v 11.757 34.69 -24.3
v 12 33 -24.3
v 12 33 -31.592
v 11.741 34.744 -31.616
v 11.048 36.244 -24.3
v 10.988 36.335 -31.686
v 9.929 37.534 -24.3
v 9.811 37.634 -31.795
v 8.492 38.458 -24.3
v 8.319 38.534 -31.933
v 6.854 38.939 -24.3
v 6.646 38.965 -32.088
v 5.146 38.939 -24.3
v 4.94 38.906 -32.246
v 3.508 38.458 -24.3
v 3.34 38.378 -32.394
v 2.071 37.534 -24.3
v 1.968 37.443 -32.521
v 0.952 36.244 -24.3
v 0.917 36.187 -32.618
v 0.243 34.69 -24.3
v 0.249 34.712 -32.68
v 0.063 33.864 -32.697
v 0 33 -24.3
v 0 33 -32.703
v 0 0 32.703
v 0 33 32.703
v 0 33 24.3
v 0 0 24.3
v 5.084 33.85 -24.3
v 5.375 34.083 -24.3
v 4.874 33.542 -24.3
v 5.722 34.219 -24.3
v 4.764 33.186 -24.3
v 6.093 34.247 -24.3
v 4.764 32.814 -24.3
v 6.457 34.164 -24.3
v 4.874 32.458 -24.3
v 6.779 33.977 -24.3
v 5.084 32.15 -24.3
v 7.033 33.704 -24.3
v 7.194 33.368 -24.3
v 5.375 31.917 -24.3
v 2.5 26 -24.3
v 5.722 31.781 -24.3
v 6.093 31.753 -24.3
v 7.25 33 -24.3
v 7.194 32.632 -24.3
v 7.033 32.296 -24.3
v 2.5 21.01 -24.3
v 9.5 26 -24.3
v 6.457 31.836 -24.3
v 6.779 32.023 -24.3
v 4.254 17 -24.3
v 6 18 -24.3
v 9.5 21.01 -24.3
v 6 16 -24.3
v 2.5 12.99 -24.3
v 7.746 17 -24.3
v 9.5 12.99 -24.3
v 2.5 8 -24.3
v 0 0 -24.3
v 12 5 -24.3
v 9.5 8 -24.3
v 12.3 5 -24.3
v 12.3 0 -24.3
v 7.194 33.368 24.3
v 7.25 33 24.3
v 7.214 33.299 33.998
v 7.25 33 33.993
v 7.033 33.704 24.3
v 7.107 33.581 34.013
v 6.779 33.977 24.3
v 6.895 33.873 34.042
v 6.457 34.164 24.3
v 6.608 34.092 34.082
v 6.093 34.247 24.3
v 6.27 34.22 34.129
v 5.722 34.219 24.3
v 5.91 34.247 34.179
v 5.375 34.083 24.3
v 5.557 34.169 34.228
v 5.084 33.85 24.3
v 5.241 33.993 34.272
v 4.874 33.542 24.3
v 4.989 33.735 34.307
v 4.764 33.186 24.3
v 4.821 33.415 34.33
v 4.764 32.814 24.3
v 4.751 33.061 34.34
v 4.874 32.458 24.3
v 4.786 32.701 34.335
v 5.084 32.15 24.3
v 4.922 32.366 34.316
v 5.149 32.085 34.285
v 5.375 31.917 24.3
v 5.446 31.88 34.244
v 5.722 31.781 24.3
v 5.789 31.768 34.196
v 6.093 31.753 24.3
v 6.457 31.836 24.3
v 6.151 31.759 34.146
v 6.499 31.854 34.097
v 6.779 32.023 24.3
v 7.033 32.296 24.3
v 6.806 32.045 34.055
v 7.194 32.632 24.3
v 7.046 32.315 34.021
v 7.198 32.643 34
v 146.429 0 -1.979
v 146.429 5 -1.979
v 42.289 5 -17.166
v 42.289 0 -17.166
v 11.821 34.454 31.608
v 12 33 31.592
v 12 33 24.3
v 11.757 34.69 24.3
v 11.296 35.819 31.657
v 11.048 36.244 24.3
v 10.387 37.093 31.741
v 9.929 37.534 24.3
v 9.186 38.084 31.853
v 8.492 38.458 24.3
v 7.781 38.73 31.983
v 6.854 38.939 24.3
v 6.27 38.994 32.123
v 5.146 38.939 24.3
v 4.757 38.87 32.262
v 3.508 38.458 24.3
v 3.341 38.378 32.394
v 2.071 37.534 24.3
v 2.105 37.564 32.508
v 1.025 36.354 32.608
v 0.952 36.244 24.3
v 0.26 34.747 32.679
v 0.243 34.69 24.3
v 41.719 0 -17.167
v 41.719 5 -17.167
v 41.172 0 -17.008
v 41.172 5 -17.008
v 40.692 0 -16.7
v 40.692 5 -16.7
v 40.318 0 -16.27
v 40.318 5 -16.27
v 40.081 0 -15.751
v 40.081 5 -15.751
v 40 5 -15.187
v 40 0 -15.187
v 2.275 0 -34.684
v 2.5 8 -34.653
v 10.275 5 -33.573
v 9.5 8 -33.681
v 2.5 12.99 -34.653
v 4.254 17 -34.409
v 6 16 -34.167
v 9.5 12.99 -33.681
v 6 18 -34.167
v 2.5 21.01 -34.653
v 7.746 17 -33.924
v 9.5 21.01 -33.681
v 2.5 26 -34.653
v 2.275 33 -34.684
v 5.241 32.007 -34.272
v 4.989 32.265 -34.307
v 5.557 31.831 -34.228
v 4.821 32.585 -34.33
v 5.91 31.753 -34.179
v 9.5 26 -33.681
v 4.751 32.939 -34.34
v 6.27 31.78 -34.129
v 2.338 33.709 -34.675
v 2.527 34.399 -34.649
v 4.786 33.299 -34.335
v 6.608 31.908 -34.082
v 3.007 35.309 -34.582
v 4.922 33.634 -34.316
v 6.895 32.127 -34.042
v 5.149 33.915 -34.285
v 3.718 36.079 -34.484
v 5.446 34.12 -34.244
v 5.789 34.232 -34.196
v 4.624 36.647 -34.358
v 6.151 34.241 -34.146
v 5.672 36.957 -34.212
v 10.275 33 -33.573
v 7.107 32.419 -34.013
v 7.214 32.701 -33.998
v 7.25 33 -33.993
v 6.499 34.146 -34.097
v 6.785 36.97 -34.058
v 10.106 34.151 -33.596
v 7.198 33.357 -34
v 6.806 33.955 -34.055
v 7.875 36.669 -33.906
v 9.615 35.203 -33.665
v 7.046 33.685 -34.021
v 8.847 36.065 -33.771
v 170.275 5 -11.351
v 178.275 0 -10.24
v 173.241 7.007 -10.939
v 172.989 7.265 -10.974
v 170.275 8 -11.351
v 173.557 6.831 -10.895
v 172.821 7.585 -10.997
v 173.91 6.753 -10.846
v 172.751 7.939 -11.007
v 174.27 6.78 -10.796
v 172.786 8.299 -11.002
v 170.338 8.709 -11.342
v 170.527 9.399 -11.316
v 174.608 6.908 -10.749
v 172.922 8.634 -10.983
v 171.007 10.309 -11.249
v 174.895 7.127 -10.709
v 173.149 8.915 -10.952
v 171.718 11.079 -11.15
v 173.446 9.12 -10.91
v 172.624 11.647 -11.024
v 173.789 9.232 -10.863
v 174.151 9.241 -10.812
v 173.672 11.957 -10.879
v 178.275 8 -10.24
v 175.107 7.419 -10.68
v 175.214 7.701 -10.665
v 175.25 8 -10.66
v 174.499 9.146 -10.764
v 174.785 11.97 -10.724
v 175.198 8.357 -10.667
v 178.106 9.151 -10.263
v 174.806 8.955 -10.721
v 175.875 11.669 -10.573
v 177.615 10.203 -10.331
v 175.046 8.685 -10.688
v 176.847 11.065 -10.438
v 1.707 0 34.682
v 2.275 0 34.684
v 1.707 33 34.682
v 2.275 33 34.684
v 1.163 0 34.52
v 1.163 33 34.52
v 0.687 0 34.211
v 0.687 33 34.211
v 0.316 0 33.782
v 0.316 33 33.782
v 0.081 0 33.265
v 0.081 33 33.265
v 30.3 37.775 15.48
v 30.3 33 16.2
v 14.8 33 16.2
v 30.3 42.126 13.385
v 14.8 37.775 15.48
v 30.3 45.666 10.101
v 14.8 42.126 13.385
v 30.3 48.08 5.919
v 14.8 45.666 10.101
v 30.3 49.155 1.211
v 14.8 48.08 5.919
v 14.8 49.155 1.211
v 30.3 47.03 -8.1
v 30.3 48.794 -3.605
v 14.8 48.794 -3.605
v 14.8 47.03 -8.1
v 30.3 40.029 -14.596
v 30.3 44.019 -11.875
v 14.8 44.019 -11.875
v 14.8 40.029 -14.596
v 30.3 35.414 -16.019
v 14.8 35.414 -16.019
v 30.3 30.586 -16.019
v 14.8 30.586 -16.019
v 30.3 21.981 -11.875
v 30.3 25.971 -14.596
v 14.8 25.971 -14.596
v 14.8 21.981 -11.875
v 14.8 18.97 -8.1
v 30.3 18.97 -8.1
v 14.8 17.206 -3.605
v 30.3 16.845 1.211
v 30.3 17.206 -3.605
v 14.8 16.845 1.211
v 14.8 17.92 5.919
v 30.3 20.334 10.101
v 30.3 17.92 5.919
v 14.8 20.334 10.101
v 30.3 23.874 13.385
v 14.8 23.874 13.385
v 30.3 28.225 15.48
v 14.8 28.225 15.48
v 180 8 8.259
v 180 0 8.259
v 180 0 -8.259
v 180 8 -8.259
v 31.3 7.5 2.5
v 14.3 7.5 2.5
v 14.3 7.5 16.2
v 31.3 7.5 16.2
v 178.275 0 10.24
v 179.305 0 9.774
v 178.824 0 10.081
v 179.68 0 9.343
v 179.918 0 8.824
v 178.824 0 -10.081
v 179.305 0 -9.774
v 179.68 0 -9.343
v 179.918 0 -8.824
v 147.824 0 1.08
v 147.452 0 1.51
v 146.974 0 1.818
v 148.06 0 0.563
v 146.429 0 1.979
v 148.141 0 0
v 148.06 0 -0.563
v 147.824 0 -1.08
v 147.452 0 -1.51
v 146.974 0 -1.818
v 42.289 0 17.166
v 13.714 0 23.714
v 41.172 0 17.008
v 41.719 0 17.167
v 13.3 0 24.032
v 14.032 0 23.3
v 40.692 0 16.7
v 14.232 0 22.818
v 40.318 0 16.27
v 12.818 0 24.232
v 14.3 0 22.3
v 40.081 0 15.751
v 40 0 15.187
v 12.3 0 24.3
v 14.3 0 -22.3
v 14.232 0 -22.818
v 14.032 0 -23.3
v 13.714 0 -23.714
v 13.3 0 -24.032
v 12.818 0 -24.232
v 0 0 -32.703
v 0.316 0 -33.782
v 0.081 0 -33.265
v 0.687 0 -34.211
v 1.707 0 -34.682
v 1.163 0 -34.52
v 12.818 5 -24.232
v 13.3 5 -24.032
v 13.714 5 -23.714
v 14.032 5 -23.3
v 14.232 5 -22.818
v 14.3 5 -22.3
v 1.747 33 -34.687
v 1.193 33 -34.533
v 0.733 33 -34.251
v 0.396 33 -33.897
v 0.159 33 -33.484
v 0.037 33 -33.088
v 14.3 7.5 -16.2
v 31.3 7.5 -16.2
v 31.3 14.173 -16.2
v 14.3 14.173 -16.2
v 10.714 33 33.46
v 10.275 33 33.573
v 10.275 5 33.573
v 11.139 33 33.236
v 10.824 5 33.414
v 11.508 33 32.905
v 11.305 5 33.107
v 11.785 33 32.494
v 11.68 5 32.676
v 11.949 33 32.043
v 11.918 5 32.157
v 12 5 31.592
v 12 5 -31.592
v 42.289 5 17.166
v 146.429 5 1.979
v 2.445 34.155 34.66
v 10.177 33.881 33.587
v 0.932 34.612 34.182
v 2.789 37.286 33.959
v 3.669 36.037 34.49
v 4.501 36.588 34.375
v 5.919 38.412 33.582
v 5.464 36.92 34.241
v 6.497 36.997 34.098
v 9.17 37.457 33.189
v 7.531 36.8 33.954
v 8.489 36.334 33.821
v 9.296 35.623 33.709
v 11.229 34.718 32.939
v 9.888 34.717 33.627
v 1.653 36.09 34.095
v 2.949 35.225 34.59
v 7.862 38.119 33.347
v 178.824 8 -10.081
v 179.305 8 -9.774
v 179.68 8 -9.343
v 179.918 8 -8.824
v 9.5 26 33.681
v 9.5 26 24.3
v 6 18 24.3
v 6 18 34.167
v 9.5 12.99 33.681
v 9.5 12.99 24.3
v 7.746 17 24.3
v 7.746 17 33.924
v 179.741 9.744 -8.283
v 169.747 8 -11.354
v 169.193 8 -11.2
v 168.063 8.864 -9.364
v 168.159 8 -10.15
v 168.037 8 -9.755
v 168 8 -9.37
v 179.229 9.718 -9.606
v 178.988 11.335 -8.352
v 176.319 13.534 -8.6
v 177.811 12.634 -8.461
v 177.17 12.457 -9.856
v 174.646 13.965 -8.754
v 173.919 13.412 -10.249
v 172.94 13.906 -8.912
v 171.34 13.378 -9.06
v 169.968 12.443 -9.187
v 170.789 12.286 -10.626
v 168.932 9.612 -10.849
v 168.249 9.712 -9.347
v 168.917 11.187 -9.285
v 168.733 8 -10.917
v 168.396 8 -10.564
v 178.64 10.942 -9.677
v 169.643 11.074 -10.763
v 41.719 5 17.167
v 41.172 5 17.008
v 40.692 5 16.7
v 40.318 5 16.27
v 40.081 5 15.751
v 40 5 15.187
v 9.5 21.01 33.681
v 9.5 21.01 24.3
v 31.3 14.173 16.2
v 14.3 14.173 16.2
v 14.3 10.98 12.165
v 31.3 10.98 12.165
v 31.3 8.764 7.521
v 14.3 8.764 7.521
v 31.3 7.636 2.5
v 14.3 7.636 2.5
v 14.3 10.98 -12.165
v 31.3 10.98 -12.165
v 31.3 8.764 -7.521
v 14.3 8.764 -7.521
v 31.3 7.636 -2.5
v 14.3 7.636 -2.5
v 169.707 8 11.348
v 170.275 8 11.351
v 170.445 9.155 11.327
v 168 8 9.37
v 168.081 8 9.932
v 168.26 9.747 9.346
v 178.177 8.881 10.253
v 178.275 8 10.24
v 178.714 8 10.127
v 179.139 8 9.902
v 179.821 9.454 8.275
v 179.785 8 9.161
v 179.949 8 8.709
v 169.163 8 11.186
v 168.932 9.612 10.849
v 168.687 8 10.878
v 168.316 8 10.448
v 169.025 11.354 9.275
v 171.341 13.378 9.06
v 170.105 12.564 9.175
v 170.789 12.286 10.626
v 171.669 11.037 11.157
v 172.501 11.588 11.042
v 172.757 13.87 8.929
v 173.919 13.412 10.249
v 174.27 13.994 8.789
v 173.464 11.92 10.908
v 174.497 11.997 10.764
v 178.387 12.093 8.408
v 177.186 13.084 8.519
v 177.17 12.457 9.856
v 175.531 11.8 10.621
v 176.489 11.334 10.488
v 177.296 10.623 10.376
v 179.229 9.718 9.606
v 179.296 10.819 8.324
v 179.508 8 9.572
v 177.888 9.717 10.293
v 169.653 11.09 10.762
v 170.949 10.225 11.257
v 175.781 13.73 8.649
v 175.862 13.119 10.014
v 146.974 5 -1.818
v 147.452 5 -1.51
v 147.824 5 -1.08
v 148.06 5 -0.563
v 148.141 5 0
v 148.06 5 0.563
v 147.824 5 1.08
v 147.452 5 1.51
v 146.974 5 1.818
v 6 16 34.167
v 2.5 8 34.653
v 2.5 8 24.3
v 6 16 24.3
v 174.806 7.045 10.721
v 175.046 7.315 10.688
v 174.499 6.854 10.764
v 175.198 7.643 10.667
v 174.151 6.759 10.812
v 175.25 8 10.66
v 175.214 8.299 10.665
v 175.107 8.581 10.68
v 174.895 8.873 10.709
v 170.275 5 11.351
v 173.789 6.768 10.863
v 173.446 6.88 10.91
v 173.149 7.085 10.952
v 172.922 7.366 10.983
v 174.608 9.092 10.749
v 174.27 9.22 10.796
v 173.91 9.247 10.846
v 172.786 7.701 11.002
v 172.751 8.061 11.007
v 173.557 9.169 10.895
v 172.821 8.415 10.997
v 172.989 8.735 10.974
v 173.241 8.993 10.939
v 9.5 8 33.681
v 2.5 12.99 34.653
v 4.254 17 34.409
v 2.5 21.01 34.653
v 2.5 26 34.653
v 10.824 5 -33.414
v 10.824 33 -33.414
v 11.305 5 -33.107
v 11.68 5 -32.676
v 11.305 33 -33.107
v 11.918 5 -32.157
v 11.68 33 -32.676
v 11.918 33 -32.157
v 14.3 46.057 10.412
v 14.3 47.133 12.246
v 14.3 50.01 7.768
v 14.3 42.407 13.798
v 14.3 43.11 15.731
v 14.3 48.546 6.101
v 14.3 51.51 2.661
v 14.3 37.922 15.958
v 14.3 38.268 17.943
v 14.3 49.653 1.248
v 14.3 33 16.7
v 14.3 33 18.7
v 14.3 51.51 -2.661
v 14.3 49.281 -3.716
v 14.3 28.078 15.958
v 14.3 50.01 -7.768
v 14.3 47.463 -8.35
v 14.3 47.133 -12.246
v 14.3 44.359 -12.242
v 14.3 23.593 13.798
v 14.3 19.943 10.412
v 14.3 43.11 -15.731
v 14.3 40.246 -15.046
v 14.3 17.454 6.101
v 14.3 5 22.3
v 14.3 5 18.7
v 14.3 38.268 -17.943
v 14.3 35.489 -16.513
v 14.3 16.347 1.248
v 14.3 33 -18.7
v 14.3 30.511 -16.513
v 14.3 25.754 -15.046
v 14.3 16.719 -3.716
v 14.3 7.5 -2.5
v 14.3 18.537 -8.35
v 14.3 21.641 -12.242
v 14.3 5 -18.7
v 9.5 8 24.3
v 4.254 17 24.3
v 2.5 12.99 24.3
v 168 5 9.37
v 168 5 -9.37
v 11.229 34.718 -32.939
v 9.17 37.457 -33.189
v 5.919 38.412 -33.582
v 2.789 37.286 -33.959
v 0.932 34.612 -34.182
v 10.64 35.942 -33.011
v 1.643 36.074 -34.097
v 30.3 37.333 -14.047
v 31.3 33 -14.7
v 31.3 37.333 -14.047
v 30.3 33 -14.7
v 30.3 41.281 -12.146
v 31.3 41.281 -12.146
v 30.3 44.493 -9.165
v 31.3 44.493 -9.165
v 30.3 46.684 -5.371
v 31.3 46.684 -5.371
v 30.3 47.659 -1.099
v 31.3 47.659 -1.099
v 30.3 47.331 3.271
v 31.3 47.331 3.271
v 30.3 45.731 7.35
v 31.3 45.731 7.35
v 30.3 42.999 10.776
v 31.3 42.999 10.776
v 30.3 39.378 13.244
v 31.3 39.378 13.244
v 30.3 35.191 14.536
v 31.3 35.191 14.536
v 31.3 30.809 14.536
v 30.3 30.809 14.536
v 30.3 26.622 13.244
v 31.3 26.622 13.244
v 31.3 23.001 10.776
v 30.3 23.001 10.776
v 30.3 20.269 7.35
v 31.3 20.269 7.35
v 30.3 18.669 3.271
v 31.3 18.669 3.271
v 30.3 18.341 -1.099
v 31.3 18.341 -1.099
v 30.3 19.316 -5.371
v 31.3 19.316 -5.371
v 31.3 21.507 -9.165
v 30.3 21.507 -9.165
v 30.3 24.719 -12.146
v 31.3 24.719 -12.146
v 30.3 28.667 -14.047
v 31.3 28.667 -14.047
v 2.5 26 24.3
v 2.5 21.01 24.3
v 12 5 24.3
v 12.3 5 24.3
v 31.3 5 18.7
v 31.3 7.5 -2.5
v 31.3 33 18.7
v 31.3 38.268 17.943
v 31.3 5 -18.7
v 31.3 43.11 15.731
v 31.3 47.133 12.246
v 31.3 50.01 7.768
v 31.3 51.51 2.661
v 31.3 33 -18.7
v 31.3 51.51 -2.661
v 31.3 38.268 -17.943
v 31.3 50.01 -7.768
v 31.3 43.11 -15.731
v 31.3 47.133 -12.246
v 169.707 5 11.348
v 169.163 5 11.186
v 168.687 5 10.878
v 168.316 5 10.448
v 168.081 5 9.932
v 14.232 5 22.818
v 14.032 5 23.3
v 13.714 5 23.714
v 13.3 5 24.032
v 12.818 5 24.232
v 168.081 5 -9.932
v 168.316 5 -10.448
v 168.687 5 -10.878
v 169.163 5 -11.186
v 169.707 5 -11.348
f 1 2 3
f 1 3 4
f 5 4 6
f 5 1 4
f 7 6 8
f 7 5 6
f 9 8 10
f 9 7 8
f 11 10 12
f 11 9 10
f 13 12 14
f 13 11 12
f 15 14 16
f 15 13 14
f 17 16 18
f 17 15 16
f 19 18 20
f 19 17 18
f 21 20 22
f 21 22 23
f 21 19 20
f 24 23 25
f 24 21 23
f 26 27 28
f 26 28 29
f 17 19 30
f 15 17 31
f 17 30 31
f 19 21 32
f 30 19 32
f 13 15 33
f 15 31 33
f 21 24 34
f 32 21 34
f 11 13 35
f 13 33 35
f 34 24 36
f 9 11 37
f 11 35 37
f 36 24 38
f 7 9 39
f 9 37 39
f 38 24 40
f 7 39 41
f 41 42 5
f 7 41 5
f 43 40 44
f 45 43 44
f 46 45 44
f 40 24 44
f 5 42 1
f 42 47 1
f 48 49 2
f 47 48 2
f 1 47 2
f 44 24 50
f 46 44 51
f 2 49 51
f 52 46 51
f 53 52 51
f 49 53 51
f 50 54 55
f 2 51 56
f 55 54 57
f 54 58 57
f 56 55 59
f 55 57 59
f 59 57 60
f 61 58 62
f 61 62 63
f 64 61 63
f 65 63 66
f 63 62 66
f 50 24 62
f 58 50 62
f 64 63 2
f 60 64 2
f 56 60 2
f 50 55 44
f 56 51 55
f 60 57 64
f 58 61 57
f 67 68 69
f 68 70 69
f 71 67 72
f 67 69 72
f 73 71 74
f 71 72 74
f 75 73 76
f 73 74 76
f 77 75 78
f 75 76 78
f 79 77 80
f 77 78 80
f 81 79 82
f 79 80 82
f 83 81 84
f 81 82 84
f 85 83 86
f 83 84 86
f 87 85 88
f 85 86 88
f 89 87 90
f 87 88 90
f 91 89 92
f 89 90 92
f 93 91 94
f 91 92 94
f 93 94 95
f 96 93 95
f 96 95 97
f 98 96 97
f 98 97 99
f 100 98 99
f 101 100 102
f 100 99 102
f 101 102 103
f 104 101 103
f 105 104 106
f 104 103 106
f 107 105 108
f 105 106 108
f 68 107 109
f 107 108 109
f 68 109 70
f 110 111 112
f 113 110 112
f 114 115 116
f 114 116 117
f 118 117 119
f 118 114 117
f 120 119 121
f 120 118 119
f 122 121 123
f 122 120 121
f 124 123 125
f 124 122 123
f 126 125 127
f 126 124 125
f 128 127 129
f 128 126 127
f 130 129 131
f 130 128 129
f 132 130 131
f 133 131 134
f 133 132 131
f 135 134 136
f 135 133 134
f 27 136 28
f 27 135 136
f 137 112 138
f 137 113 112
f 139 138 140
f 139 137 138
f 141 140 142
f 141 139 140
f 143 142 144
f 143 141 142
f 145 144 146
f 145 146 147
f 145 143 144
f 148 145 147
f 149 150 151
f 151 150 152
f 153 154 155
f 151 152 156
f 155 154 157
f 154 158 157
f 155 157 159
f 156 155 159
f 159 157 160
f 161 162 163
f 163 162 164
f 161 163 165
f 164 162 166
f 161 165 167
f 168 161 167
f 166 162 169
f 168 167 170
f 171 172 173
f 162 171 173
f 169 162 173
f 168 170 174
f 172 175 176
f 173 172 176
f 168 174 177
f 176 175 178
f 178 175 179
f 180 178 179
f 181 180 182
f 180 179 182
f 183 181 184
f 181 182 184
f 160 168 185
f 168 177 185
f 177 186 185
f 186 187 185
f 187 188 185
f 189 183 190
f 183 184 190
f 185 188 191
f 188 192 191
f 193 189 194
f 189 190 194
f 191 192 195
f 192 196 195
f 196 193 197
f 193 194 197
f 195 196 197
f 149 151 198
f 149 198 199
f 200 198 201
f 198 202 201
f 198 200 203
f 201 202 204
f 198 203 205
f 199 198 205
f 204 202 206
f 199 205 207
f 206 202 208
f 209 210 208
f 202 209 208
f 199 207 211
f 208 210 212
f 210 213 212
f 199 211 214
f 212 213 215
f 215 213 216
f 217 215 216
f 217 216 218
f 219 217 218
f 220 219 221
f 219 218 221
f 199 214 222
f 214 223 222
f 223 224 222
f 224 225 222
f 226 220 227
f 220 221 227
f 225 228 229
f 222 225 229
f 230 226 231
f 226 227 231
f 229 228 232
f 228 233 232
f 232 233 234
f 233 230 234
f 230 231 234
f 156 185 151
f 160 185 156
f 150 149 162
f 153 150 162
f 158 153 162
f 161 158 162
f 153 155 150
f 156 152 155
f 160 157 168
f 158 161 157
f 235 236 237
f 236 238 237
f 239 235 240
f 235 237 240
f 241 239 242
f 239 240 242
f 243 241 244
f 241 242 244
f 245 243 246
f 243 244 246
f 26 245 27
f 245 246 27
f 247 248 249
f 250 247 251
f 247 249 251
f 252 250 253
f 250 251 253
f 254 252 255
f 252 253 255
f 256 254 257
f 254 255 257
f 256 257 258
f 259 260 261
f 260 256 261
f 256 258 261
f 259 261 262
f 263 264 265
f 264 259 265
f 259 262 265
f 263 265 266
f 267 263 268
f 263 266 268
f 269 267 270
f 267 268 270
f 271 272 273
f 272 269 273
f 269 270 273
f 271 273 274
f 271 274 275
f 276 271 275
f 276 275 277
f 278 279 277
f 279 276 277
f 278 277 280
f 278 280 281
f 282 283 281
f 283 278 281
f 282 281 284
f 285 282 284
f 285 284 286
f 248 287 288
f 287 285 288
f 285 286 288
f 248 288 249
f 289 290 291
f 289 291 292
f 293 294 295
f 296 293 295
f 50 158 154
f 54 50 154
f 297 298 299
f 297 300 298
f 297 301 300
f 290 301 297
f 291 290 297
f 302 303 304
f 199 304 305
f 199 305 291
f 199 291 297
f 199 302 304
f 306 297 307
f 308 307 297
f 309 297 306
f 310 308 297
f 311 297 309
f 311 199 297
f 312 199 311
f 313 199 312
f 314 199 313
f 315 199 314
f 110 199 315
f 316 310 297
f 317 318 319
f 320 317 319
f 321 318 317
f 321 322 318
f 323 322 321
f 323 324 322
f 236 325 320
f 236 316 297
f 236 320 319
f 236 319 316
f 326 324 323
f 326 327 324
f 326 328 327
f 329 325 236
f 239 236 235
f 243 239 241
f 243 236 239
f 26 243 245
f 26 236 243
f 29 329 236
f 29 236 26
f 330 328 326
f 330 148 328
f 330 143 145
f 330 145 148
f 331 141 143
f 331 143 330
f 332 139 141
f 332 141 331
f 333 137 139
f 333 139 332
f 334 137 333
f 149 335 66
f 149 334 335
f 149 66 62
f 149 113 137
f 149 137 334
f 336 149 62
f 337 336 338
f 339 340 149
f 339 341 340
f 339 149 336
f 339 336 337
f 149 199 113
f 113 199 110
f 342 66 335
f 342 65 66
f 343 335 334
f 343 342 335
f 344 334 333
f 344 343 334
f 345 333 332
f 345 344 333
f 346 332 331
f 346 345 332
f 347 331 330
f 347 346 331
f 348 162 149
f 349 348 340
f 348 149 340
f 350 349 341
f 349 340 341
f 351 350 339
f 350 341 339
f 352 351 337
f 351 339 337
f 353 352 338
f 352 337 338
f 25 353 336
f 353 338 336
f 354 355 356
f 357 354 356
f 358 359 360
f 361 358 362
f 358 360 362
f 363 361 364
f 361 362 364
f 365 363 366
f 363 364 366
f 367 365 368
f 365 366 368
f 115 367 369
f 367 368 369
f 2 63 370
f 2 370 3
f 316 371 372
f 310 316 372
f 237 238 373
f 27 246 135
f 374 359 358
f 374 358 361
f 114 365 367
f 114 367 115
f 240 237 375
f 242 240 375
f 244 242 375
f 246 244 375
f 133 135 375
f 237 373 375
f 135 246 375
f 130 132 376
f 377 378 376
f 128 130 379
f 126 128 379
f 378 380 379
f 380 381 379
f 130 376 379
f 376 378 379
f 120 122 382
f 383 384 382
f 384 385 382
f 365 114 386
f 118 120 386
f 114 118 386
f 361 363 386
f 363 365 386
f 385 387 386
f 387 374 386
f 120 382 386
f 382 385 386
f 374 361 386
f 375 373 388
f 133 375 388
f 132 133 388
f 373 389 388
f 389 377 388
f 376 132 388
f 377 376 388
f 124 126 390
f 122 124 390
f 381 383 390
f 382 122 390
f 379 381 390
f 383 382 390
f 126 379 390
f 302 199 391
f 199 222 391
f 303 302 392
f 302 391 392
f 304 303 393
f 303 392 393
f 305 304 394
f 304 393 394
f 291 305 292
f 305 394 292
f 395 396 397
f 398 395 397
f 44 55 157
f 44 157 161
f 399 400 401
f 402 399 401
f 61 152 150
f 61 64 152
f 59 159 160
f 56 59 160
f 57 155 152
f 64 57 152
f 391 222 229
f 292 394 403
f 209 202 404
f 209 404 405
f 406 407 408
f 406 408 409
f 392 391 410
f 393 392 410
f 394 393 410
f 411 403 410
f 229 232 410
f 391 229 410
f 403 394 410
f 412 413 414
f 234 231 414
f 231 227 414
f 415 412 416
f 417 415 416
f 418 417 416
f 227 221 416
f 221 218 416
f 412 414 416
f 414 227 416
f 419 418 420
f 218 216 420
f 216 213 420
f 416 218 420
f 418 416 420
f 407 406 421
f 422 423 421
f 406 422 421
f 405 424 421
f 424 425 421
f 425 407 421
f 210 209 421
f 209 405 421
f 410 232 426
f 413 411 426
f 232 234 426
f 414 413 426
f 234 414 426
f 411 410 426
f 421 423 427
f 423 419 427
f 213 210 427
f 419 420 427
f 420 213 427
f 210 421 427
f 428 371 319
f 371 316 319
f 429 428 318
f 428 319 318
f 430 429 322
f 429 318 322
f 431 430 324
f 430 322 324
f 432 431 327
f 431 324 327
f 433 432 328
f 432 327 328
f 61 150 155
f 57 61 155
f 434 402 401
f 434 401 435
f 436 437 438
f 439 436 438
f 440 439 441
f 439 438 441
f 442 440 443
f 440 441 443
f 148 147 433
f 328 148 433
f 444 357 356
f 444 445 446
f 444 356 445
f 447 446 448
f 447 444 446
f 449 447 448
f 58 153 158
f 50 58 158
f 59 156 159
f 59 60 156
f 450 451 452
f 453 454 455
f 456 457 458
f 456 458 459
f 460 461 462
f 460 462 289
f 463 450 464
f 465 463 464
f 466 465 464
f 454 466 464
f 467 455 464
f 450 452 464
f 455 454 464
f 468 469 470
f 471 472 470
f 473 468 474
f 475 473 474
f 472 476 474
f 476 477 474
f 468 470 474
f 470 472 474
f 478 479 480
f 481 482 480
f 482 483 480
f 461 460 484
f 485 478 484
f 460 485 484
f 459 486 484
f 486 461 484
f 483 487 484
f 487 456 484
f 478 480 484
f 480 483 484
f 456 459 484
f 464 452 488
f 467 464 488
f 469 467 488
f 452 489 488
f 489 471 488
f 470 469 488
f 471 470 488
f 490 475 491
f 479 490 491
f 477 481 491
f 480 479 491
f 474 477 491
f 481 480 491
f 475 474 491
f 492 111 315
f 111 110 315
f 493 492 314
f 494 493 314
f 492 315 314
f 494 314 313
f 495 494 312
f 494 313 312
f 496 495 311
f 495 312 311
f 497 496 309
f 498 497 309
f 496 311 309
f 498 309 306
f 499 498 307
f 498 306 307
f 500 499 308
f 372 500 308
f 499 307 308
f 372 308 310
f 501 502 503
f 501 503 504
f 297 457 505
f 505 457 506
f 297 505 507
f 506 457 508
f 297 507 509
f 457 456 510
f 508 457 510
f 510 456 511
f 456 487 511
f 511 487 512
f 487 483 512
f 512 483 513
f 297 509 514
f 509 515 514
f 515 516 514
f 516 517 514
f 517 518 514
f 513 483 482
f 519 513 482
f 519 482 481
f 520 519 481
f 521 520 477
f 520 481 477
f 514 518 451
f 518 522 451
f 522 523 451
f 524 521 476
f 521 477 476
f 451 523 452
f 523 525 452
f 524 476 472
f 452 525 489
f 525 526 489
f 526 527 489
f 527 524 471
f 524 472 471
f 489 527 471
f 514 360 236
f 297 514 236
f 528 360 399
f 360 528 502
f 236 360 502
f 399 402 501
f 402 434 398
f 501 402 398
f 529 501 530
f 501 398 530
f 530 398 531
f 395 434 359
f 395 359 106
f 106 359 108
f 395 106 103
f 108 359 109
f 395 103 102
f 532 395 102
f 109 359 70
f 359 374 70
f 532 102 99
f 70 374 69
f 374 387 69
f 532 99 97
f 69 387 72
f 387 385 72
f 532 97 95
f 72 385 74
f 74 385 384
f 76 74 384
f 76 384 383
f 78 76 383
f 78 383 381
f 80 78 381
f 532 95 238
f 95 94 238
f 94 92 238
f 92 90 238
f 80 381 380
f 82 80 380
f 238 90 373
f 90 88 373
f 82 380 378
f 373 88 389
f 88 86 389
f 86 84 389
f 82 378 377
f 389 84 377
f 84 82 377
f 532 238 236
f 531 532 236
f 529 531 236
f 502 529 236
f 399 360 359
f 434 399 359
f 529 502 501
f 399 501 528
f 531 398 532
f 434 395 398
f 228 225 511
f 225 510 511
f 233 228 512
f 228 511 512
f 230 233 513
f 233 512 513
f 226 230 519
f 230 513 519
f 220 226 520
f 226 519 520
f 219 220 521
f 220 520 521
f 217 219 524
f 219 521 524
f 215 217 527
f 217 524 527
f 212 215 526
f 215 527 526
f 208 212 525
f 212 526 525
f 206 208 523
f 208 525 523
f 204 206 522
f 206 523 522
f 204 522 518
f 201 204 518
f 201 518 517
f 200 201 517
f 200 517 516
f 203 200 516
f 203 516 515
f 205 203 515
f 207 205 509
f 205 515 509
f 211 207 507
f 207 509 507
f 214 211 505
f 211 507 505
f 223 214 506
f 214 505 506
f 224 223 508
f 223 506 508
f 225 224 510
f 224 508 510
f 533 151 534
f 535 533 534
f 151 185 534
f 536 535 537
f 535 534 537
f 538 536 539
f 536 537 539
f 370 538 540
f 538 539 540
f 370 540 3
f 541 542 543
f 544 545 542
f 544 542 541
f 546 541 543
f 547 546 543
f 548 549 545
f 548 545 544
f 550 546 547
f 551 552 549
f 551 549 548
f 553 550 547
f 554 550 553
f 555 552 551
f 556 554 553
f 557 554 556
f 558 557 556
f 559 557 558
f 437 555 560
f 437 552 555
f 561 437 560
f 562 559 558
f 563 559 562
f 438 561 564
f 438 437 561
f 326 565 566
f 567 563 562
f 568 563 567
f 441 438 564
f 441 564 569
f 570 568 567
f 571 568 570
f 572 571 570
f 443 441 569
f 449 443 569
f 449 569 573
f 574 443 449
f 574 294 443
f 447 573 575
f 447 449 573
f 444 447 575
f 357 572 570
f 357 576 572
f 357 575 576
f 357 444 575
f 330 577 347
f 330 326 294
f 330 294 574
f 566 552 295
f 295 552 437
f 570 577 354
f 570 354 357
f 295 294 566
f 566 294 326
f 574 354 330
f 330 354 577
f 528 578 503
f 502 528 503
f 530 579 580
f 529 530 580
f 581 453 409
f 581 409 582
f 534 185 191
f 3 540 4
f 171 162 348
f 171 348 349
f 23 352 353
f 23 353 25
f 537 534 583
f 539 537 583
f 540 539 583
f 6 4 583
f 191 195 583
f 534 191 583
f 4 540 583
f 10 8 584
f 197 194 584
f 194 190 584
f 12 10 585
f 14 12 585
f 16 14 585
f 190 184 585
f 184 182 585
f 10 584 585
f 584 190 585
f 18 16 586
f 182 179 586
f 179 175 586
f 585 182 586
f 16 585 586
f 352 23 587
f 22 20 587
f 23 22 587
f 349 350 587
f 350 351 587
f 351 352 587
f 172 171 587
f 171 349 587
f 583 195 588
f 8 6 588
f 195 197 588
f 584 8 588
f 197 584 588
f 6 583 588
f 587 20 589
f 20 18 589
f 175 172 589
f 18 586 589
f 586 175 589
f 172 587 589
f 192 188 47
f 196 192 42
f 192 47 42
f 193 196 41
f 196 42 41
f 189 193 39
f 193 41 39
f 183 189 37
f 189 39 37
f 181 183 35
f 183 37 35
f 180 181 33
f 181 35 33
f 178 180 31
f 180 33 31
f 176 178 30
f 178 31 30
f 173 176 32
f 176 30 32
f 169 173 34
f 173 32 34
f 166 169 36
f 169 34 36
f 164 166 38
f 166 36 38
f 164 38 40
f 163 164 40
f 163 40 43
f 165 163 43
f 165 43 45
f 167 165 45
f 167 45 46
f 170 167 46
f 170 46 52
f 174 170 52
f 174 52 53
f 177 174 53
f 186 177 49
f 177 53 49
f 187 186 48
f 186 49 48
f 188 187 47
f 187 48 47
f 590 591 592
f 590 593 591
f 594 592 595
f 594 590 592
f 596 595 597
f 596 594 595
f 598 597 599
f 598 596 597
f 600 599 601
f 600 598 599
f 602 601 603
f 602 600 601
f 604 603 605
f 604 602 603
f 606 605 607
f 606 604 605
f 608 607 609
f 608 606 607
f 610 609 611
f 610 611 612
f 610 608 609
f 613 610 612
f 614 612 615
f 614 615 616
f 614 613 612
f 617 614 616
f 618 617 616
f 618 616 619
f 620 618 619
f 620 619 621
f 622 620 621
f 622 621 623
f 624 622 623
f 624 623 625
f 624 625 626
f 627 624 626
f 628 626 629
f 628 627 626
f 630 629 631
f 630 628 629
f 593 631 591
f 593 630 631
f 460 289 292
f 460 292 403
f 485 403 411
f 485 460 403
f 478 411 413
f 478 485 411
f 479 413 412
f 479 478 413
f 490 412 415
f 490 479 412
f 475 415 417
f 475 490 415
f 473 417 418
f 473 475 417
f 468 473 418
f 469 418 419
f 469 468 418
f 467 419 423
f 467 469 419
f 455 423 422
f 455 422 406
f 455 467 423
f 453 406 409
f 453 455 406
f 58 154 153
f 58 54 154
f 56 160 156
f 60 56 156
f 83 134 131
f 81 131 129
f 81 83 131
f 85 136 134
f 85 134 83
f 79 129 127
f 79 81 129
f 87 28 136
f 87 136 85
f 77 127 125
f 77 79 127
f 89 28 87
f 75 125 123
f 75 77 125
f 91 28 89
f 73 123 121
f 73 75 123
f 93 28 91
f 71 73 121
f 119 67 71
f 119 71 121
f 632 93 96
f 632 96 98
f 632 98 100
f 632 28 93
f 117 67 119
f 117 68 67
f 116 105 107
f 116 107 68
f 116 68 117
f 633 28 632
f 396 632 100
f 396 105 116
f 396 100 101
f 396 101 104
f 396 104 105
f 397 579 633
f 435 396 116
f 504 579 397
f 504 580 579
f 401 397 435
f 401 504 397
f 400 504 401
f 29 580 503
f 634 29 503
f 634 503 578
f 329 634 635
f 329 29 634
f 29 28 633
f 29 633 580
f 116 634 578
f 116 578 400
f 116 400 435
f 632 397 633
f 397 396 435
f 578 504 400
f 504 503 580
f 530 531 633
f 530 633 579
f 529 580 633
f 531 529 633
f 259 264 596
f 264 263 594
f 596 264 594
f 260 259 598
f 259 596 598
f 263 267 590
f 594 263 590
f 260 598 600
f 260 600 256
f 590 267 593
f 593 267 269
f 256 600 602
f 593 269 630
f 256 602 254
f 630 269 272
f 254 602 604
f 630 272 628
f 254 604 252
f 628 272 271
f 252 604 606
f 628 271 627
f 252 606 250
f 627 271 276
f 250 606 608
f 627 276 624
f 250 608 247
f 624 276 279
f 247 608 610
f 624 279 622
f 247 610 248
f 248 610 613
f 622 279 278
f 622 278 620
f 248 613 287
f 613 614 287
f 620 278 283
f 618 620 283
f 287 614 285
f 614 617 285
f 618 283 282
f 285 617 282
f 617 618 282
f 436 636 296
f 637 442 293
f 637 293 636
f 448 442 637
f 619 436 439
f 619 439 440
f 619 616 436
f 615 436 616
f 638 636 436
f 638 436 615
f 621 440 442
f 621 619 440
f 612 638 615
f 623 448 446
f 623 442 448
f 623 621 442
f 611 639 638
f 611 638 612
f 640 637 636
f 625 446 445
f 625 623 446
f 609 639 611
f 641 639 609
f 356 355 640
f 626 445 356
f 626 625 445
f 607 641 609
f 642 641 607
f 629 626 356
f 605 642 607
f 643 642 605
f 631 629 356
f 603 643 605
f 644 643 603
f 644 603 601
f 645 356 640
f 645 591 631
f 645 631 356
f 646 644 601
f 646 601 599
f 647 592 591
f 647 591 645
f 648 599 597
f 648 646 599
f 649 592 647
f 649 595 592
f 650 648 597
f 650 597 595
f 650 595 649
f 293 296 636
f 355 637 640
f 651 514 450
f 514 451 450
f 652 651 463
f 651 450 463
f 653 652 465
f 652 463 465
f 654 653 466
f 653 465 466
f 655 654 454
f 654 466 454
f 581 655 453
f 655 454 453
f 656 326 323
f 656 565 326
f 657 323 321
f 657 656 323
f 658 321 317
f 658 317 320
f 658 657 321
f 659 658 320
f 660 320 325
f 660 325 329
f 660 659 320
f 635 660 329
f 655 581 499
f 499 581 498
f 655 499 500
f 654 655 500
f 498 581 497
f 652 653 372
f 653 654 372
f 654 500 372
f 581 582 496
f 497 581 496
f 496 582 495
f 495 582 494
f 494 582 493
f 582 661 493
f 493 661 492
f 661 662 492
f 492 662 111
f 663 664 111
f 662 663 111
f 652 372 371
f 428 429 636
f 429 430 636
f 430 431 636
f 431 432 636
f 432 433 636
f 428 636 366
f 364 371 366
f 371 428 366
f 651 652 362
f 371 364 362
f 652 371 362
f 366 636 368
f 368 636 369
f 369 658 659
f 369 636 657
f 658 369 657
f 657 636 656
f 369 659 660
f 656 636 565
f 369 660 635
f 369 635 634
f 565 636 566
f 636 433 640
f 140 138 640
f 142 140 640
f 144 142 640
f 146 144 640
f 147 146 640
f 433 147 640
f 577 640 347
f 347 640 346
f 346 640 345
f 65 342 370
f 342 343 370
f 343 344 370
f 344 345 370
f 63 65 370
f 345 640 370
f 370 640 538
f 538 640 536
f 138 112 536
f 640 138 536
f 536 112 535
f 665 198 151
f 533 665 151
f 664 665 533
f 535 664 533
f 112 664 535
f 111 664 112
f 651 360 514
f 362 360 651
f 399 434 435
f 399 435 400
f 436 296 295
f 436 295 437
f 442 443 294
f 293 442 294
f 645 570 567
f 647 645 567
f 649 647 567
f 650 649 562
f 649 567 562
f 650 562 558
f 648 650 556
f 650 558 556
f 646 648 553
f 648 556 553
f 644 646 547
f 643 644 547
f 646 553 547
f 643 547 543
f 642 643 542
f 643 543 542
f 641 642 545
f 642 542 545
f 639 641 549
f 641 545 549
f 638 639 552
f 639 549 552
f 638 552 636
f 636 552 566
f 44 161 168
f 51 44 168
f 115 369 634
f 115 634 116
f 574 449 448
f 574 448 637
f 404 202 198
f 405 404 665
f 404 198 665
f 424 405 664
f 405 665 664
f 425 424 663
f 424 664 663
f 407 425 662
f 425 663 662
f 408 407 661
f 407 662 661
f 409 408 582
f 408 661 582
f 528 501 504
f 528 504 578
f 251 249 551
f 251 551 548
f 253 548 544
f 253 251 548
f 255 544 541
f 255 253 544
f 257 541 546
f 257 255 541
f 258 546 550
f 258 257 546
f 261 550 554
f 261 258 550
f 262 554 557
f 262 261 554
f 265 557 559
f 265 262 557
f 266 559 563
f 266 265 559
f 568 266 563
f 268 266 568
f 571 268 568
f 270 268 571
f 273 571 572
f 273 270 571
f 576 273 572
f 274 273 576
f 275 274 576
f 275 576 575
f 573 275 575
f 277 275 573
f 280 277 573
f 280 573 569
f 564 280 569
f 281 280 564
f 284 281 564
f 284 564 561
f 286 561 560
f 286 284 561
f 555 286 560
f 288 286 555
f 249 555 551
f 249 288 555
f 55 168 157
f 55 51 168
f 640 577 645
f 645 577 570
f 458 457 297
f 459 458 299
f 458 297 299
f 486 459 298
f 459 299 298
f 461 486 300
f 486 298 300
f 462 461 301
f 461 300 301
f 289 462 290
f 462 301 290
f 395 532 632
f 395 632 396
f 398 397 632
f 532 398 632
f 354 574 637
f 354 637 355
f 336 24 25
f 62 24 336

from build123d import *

# Parameters (mm, degrees)
BOSS_EXTRUDE1_DEPTH             = 5
BOSS_EXTRUDE2_REACH             = 185.439
SKETCH2_R                       = 1.25
BOSS_EXTRUDE2_DIRECTION_2_REACH = 185.439
CUT_EXTRUDE1_DEPTH              = 188.472664674
CUT_EXTRUDE1_DEPTH_BACK         = 188.472664674
SKETCH4_W                       = 14.3
SKETCH4_H                       = 48.6
SKETCH5_RX                      = 1.25
SKETCH5_RY                      = 0.173611111
SKETCH5_R                       = 16.2
BOSS_EXTRUDE3_DEPTH             = 16.5
SKETCH7_R                       = 16.2
SKETCH7_R_2                     = 14.7
BOSS_EXTRUDE5_DEPTH             = 0.5
CUT_EXTRUDE2_DEPTH              = 190.224443453
FILLET2_R                       = 2
FILLET5_R                       = 2
CHAMFER1_SIZE                   = 0.5
FILLET6_R                       = 2


with BuildPart() as part:
    # Sketch1 → Boss-Extrude1 (new body)
    with BuildSketch(Plane(origin=(0, 0, 0), x_dir=(1, 0, 0), z_dir=(0, 1, 0))):
        Polygon((0, -35), (0, 35), (180, 10), (180, -10), align=None)
    extrude(amount=BOSS_EXTRUDE1_DEPTH)

    # Boss-Extrude2: up to this plane
    boss_extrude2_end = Plane(origin=(4.769114307, 5, 34.337623013), z_dir=(-0.1375683712746877, 0, -0.9904922731777516))
    # Sketch2 → Boss-Extrude2 (add, up to the surface)
    with BuildSketch(Plane.XY, mode=Mode.PRIVATE) as boss_extrude2_sk1:
        with BuildLine():
            Line((0, 33), (0, 5))
            Line((0, 5), (12, 5))
            Line((12, 5), (12, 33))
            ThreePointArc((12, 33), (6, 39), (0, 33))
        make_face()
        Polygon((2.5, 8), (6, 16), (9.5, 8), align=None, mode=Mode.SUBTRACT)
        Polygon((2.5, 12.989785485), (2.5, 21.010214515), (4.25446885, 17), align=None, mode=Mode.SUBTRACT)
        Polygon((7.74553115, 17), (9.5, 21.010214515), (9.5, 12.989785485), align=None, mode=Mode.SUBTRACT)
        Polygon((6, 18), (2.5, 26), (9.5, 26), align=None, mode=Mode.SUBTRACT)
        with Locations((6, 33)):
            Circle(SKETCH2_R, mode=Mode.SUBTRACT)
    boss_extrude2_tool1 = split(extrude(boss_extrude2_sk1.sketch, amount=BOSS_EXTRUDE2_REACH, mode=Mode.PRIVATE), bisect_by=boss_extrude2_end, keep=Keep.BOTH, mode=Mode.PRIVATE)
    add(boss_extrude2_tool1.solids().sort_by_distance((11.639445, 19, 0))[0])
    # Sketch2 → Boss-Extrude2 (add, up to the surface)
    with BuildSketch(Plane.XY, mode=Mode.PRIVATE) as boss_extrude2_sk2:
        with BuildLine():
            Line((168, 8), (168, 5))
            Line((168, 5), (180, 5))
            Line((180, 5), (180, 8))
            ThreePointArc((180, 8), (174, 14), (168, 8))
        make_face()
        with Locations((174, 8)):
            Circle(SKETCH2_R, mode=Mode.SUBTRACT)
    boss_extrude2_tool2 = split(extrude(boss_extrude2_sk2.sketch, amount=BOSS_EXTRUDE2_REACH, mode=Mode.PRIVATE), bisect_by=boss_extrude2_end, keep=Keep.BOTH, mode=Mode.PRIVATE)
    add(boss_extrude2_tool2.solids().sort_by_distance((168.15, 6.5, 0))[0])

    # Boss-Extrude2 direction 2: up to this plane
    boss_extrude2_direction_2_end = Plane(origin=(4.769114307, 5, -34.337623013), z_dir=(-0.1375683712746877, 0, 0.9904922731777516))
    # Sketch2 → Boss-Extrude2 direction 2 (add, up to the surface)
    with BuildSketch(Plane.XY, mode=Mode.PRIVATE) as boss_extrude2_direction_2_sk1:
        with BuildLine():
            Line((0, 33), (0, 5))
            Line((0, 5), (12, 5))
            Line((12, 5), (12, 33))
            ThreePointArc((12, 33), (6, 39), (0, 33))
        make_face()
        Polygon((2.5, 8), (6, 16), (9.5, 8), align=None, mode=Mode.SUBTRACT)
        Polygon((2.5, 12.989785485), (2.5, 21.010214515), (4.25446885, 17), align=None, mode=Mode.SUBTRACT)
        Polygon((7.74553115, 17), (9.5, 21.010214515), (9.5, 12.989785485), align=None, mode=Mode.SUBTRACT)
        Polygon((6, 18), (2.5, 26), (9.5, 26), align=None, mode=Mode.SUBTRACT)
        with Locations((6, 33)):
            Circle(SKETCH2_R, mode=Mode.SUBTRACT)
    boss_extrude2_direction_2_tool1 = split(extrude(boss_extrude2_direction_2_sk1.sketch, amount=-BOSS_EXTRUDE2_DIRECTION_2_REACH, mode=Mode.PRIVATE), bisect_by=boss_extrude2_direction_2_end, keep=Keep.BOTH, mode=Mode.PRIVATE)
    add(boss_extrude2_direction_2_tool1.solids().sort_by_distance((11.639445, 19, 0))[0])
    # Sketch2 → Boss-Extrude2 direction 2 (add, up to the surface)
    with BuildSketch(Plane.XY, mode=Mode.PRIVATE) as boss_extrude2_direction_2_sk2:
        with BuildLine():
            Line((168, 8), (168, 5))
            Line((168, 5), (180, 5))
            Line((180, 5), (180, 8))
            ThreePointArc((180, 8), (174, 14), (168, 8))
        make_face()
        with Locations((174, 8)):
            Circle(SKETCH2_R, mode=Mode.SUBTRACT)
    boss_extrude2_direction_2_tool2 = split(extrude(boss_extrude2_direction_2_sk2.sketch, amount=-BOSS_EXTRUDE2_DIRECTION_2_REACH, mode=Mode.PRIVATE), bisect_by=boss_extrude2_direction_2_end, keep=Keep.BOTH, mode=Mode.PRIVATE)
    add(boss_extrude2_direction_2_tool2.solids().sort_by_distance((168.15, 6.5, 0))[0])

    # Sketch4 → Cut-Extrude1 (cut, two sides: drawn at the far end of the back side and taken through both)
    with BuildSketch(Plane(origin=(0, 0, 0), x_dir=(1, 0, 0), z_dir=(0, 1, 0)).offset(-CUT_EXTRUDE1_DEPTH_BACK)):
        with Locations((7.15, 0)):
            Rectangle(SKETCH4_W, SKETCH4_H)
    extrude(amount=CUT_EXTRUDE1_DEPTH + CUT_EXTRUDE1_DEPTH_BACK, mode=Mode.SUBTRACT)

    # Sketch5 → Boss-Extrude3 (add)
    # profile 1 of 2: a face of its own
    with BuildSketch(Plane.ZY.offset(-14.3)):
        with Locations(Location((-34.166666667, 33), (0, 0, 90))):
            Ellipse(SKETCH5_RX, SKETCH5_RY)
    # profile 2 of 2: a face of its own
    with BuildSketch(Plane.ZY.offset(-14.3)):
        with BuildLine():
            Line((-18.7, 5), (-18.7, 33))
            ThreePointArc((-18.7, 33), (0, 51.7), (18.7, 33))
            Line((18.7, 33), (18.7, 5))
            Line((18.7, 5), (-18.7, 5))
        make_face()
        with Locations((0, 33)):
            Circle(SKETCH5_R, mode=Mode.SUBTRACT)
        with BuildLine():
            Line((16.2, 7.5), (16.2, 14.173334694))
            ThreePointArc((16.2, 14.173334694), (9.90483685, 9.7420086), (2.5, 7.63627327))
            Line((2.5, 7.63627327), (2.5, 7.5))
            Line((2.5, 7.5), (16.2, 7.5))
        make_face(mode=Mode.SUBTRACT)
        with BuildLine():
            Line((-16.2, 7.5), (-16.2, 14.173334694))
            ThreePointArc((-16.2, 14.173334694), (-9.90483685, 9.7420086), (-2.5, 7.63627327))
            Line((-2.5, 7.63627327), (-2.5, 7.5))
            Line((-2.5, 7.5), (-16.2, 7.5))
        make_face(mode=Mode.SUBTRACT)
    extrude(amount=-BOSS_EXTRUDE3_DEPTH)


with BuildPart() as boss_extrude3_kept_piece:
    # of the separate pieces the step leaves, the one the design keeps (boss_extrude3_pieces_kept)
    add(part.part.solids().sort_by_distance((0, 0, 35))[0])

    # Sketch7 → Boss-Extrude5 (add, symmetric)
    # profile 1 of 2: a face of its own
    with BuildSketch(Plane(origin=(30.8, 0, 0), x_dir=(0, 0, -1), z_dir=(1, 0, 0))):
        with BuildLine():
            Line((18.7, 5), (18.7, 33))
            ThreePointArc((18.7, 33), (0, 51.7), (-18.7, 33))
            Line((-18.7, 33), (-18.7, 5))
            Line((-18.7, 5), (18.7, 5))
        make_face()
        with Locations(Location((0, 33, 0), (0, 0, 180))):
            Circle(SKETCH7_R, mode=Mode.SUBTRACT)
        with BuildLine():
            ThreePointArc((-16.2, 14.173334694), (-9.90483685, 9.7420086), (-2.5, 7.63627327))
            Line((-2.5, 7.63627327), (-2.5, 7.5))
            Line((-2.5, 7.5), (-16.2, 7.5))
            Line((-16.2, 7.5), (-16.2, 14.173334694))
        make_face(mode=Mode.SUBTRACT)
        with BuildLine():
            ThreePointArc((2.5, 7.63627327), (9.90483685, 9.7420086), (16.2, 14.173334694))
            Line((16.2, 14.173334694), (16.2, 7.5))
            Line((16.2, 7.5), (2.5, 7.5))
            Line((2.5, 7.5), (2.5, 7.63627327))
        make_face(mode=Mode.SUBTRACT)
    # profile 2 of 2: a face of its own
    with BuildSketch(Plane(origin=(30.8, 0, 0), x_dir=(0, 0, -1), z_dir=(1, 0, 0))):
        with Locations(Location((0, 33, 0), (0, 0, 180))):
            Circle(SKETCH7_R)
        with Locations((0, 33)):
            Circle(SKETCH7_R_2, mode=Mode.SUBTRACT)
    extrude(amount=BOSS_EXTRUDE5_DEPTH, both=True)

    # Sketch8 → Cut-Extrude2 (cut, through all)
    with BuildSketch(Plane(origin=(0, 5, 0), x_dir=(1, 0, 0), z_dir=(0, 1, 0))):
        Polygon((40, 17.5), (40, -17.5), (160, 0), align=None)
    extrude(amount=-CUT_EXTRUDE2_DEPTH, mode=Mode.SUBTRACT)

    # Fillet2
    fillet2_edges = [boss_extrude3_kept_piece.edges().sort_by_distance(p)[0] for p in [
        (40, 2.5, -17.5),
        (160, 2.5, 0),
        (40, 2.5, 17.5),
    ]]
    fillet(fillet2_edges, radius=FILLET2_R)

    # Fillet5
    fillet5_edges = [boss_extrude3_kept_piece.edges().sort_by_distance(p)[0] for p in [
        (14.3, 2.5, 24.3),
        (14.3, 2.5, -24.3),
    ]]
    fillet(fillet5_edges, radius=FILLET5_R)

    # Chamfer1
    chamfer1_edges = [boss_extrude3_kept_piece.edges().sort_by_distance(p)[0] for p in [
        (14.3, 33, -16.2),
    ]]
    chamfer(chamfer1_edges, length=CHAMFER1_SIZE)

    # Fillet6
    fillet6_edges = [boss_extrude3_kept_piece.edges().sort_by_distance(p)[0] for p in [
        (12, 19, 33.333333333),
        (6, 39, -34.166666667),
        (6, 39, 34.166666667),
        (12, 19, -33.333333333),
        (174, 14, -10.833333333),
        (168, 6.5, -11.666666667),
        (174, 14, 10.833333333),
        (168, 6.5, 11.666666667),
        (180, 4, 10),
        (0, 16.5, 35),
        (0, 16.5, -35),
        (180, 4, -10),
    ]]
    fillet(fillet6_edges, radius=FILLET6_R)


solid = boss_extrude3_kept_piece.part
